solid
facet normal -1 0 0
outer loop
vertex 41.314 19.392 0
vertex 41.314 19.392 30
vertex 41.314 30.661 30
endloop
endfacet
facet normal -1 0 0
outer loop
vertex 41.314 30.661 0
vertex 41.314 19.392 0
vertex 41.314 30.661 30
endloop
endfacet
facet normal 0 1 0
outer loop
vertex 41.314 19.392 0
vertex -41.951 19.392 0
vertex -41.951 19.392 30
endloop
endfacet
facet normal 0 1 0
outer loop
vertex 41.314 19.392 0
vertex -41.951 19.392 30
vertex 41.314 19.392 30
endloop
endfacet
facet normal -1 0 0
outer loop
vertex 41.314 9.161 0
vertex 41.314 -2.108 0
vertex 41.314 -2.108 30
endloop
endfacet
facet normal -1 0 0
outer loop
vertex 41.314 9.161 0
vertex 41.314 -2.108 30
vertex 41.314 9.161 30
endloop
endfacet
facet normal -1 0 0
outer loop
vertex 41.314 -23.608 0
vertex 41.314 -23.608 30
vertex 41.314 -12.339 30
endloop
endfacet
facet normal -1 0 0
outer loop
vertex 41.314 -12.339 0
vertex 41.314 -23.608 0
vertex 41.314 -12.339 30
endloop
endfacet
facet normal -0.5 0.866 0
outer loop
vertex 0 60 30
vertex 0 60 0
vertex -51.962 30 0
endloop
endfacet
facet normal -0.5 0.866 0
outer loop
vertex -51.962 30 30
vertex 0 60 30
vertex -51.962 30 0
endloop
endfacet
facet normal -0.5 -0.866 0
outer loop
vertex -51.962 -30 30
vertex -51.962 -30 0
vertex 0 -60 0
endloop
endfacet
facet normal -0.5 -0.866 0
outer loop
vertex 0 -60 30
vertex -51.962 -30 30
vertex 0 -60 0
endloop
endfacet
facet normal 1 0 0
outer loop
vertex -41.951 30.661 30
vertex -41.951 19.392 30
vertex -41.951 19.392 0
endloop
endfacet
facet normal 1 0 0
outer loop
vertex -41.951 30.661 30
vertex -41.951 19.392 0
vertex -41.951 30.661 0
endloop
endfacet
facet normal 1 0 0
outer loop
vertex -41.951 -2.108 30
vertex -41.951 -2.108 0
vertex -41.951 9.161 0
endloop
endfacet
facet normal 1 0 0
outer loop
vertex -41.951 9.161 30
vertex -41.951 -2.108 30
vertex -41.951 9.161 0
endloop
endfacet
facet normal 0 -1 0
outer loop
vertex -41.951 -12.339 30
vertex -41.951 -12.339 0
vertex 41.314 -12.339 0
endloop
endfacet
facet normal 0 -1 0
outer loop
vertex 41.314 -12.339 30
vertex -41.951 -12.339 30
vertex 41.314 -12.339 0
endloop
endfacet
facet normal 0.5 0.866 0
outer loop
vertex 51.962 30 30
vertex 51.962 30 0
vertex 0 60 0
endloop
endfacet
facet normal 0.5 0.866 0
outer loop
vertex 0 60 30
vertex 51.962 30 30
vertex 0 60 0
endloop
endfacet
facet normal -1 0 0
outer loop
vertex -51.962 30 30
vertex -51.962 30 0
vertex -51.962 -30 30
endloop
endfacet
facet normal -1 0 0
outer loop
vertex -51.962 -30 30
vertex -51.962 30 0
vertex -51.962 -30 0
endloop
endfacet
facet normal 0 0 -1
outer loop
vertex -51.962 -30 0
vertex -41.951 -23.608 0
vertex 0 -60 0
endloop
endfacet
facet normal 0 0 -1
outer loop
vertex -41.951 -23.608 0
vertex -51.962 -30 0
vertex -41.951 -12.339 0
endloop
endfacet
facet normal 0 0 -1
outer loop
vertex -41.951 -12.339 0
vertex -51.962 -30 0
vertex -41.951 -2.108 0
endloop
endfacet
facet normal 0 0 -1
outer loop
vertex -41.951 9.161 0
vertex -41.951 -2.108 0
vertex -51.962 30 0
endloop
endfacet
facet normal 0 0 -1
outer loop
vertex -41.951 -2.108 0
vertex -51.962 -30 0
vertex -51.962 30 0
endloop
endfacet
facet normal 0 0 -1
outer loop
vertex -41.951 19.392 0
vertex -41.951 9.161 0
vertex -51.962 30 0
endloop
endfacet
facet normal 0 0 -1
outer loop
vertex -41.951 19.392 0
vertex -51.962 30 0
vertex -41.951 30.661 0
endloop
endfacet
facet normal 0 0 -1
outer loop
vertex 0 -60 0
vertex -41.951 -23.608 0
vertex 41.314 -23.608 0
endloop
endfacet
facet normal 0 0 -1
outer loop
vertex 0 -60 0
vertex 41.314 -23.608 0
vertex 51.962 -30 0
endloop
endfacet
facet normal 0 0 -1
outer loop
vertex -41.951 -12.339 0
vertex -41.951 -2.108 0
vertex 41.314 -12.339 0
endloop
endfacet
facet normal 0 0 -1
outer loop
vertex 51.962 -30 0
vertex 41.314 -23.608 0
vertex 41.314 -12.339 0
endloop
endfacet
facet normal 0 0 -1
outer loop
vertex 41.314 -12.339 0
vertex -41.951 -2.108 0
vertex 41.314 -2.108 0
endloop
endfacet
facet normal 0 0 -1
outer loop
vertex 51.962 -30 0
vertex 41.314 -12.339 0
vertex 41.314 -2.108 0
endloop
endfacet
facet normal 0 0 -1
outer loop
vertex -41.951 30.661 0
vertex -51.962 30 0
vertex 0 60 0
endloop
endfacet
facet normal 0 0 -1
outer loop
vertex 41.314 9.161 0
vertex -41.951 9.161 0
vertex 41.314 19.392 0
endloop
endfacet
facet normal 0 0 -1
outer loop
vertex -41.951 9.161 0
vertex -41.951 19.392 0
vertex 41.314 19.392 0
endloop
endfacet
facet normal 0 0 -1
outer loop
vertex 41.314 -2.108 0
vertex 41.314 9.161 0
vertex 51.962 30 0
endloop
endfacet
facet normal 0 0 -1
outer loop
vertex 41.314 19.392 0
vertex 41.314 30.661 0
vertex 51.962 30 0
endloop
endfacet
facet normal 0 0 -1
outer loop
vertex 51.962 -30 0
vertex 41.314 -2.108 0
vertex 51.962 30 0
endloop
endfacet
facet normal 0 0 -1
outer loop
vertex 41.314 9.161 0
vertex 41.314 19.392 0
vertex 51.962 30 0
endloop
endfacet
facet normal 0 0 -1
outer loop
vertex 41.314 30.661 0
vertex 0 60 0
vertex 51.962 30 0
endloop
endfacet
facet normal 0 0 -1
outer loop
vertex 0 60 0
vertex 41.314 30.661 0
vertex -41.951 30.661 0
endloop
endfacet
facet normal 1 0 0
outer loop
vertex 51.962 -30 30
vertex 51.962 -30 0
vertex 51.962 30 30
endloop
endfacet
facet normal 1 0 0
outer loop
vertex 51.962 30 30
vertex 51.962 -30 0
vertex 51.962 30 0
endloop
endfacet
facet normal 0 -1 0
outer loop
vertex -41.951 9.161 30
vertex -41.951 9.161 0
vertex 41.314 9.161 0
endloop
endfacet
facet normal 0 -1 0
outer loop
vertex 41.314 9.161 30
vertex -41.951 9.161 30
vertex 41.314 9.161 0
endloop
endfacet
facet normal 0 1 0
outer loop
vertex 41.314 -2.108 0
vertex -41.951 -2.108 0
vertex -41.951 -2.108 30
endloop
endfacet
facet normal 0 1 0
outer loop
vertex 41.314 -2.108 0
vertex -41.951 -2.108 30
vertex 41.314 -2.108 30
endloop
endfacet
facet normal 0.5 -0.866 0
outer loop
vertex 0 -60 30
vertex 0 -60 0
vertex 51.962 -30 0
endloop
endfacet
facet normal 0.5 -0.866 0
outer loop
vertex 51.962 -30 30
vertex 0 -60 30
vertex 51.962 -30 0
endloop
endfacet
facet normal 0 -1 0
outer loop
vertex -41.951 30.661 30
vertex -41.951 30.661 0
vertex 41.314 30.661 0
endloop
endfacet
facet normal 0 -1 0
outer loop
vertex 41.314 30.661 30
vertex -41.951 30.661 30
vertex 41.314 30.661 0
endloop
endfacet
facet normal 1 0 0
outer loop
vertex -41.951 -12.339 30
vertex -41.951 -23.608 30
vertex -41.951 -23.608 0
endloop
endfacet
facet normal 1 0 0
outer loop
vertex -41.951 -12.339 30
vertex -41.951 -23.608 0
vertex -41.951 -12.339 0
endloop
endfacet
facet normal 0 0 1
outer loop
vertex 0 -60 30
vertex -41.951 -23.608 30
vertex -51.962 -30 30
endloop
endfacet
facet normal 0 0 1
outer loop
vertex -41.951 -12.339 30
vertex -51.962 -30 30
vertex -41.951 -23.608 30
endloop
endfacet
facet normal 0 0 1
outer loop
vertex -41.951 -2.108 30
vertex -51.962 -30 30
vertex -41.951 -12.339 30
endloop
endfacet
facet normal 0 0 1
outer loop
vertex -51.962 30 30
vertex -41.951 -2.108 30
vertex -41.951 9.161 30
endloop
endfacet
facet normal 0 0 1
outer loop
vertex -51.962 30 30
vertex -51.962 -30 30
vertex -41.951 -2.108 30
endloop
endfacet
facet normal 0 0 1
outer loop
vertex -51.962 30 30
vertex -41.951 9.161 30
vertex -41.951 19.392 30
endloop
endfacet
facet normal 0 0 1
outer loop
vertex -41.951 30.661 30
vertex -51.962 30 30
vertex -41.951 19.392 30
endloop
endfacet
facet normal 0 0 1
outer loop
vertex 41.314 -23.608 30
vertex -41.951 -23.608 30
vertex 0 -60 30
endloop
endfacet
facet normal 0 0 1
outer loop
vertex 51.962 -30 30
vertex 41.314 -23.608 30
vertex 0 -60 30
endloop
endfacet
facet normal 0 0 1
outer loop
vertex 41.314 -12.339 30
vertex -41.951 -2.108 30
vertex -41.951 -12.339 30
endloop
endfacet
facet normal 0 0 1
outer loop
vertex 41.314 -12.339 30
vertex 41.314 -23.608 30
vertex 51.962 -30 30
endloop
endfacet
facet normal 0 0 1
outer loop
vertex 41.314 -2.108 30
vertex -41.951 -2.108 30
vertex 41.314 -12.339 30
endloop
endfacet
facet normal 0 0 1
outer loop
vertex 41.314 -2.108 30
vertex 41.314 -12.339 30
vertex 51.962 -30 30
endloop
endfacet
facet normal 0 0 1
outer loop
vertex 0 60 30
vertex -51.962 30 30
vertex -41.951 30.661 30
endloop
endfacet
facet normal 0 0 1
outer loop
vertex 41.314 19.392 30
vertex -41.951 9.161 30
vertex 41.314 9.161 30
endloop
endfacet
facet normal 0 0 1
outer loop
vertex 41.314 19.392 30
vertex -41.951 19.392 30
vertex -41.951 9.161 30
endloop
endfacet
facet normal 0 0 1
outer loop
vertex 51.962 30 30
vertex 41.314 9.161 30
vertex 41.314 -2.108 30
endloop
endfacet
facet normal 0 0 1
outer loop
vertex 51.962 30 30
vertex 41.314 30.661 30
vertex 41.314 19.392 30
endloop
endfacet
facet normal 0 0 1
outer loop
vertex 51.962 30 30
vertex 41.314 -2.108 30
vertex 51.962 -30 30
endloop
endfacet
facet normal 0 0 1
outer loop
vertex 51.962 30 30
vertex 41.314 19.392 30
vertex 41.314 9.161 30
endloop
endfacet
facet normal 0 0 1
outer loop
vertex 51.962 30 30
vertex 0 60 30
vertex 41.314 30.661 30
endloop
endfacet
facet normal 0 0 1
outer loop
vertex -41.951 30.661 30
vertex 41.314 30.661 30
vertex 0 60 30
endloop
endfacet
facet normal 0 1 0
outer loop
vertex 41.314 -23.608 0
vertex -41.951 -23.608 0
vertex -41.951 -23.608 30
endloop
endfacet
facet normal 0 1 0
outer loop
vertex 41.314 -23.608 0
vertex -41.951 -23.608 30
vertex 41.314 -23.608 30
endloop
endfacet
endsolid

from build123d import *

# Parameters (mm, degrees)
F0_W     = 83.26438
F0_H     = 11.269071
F1_DEPTH = 30


with BuildPart() as f1:
    # F0 (on Top) → F1 (new body)
    with BuildSketch(Plane.XY):
        Polygon((51.961524, -30), (51.961524, 30), (0, 60), (-51.961524, 30), (-51.961524, -30), (0, -60), align=None)
        with Locations((-0.318665, -17.973065)):
            Rectangle(F0_W, F0_H, mode=Mode.SUBTRACT)
        with Locations((-0.318665, 3.526934)):
            Rectangle(F0_W, F0_H, mode=Mode.SUBTRACT)
        with Locations((-0.318665, 25.026934)):
            Rectangle(F0_W, F0_H, mode=Mode.SUBTRACT)
    extrude(amount=F1_DEPTH)


solid = f1.part
